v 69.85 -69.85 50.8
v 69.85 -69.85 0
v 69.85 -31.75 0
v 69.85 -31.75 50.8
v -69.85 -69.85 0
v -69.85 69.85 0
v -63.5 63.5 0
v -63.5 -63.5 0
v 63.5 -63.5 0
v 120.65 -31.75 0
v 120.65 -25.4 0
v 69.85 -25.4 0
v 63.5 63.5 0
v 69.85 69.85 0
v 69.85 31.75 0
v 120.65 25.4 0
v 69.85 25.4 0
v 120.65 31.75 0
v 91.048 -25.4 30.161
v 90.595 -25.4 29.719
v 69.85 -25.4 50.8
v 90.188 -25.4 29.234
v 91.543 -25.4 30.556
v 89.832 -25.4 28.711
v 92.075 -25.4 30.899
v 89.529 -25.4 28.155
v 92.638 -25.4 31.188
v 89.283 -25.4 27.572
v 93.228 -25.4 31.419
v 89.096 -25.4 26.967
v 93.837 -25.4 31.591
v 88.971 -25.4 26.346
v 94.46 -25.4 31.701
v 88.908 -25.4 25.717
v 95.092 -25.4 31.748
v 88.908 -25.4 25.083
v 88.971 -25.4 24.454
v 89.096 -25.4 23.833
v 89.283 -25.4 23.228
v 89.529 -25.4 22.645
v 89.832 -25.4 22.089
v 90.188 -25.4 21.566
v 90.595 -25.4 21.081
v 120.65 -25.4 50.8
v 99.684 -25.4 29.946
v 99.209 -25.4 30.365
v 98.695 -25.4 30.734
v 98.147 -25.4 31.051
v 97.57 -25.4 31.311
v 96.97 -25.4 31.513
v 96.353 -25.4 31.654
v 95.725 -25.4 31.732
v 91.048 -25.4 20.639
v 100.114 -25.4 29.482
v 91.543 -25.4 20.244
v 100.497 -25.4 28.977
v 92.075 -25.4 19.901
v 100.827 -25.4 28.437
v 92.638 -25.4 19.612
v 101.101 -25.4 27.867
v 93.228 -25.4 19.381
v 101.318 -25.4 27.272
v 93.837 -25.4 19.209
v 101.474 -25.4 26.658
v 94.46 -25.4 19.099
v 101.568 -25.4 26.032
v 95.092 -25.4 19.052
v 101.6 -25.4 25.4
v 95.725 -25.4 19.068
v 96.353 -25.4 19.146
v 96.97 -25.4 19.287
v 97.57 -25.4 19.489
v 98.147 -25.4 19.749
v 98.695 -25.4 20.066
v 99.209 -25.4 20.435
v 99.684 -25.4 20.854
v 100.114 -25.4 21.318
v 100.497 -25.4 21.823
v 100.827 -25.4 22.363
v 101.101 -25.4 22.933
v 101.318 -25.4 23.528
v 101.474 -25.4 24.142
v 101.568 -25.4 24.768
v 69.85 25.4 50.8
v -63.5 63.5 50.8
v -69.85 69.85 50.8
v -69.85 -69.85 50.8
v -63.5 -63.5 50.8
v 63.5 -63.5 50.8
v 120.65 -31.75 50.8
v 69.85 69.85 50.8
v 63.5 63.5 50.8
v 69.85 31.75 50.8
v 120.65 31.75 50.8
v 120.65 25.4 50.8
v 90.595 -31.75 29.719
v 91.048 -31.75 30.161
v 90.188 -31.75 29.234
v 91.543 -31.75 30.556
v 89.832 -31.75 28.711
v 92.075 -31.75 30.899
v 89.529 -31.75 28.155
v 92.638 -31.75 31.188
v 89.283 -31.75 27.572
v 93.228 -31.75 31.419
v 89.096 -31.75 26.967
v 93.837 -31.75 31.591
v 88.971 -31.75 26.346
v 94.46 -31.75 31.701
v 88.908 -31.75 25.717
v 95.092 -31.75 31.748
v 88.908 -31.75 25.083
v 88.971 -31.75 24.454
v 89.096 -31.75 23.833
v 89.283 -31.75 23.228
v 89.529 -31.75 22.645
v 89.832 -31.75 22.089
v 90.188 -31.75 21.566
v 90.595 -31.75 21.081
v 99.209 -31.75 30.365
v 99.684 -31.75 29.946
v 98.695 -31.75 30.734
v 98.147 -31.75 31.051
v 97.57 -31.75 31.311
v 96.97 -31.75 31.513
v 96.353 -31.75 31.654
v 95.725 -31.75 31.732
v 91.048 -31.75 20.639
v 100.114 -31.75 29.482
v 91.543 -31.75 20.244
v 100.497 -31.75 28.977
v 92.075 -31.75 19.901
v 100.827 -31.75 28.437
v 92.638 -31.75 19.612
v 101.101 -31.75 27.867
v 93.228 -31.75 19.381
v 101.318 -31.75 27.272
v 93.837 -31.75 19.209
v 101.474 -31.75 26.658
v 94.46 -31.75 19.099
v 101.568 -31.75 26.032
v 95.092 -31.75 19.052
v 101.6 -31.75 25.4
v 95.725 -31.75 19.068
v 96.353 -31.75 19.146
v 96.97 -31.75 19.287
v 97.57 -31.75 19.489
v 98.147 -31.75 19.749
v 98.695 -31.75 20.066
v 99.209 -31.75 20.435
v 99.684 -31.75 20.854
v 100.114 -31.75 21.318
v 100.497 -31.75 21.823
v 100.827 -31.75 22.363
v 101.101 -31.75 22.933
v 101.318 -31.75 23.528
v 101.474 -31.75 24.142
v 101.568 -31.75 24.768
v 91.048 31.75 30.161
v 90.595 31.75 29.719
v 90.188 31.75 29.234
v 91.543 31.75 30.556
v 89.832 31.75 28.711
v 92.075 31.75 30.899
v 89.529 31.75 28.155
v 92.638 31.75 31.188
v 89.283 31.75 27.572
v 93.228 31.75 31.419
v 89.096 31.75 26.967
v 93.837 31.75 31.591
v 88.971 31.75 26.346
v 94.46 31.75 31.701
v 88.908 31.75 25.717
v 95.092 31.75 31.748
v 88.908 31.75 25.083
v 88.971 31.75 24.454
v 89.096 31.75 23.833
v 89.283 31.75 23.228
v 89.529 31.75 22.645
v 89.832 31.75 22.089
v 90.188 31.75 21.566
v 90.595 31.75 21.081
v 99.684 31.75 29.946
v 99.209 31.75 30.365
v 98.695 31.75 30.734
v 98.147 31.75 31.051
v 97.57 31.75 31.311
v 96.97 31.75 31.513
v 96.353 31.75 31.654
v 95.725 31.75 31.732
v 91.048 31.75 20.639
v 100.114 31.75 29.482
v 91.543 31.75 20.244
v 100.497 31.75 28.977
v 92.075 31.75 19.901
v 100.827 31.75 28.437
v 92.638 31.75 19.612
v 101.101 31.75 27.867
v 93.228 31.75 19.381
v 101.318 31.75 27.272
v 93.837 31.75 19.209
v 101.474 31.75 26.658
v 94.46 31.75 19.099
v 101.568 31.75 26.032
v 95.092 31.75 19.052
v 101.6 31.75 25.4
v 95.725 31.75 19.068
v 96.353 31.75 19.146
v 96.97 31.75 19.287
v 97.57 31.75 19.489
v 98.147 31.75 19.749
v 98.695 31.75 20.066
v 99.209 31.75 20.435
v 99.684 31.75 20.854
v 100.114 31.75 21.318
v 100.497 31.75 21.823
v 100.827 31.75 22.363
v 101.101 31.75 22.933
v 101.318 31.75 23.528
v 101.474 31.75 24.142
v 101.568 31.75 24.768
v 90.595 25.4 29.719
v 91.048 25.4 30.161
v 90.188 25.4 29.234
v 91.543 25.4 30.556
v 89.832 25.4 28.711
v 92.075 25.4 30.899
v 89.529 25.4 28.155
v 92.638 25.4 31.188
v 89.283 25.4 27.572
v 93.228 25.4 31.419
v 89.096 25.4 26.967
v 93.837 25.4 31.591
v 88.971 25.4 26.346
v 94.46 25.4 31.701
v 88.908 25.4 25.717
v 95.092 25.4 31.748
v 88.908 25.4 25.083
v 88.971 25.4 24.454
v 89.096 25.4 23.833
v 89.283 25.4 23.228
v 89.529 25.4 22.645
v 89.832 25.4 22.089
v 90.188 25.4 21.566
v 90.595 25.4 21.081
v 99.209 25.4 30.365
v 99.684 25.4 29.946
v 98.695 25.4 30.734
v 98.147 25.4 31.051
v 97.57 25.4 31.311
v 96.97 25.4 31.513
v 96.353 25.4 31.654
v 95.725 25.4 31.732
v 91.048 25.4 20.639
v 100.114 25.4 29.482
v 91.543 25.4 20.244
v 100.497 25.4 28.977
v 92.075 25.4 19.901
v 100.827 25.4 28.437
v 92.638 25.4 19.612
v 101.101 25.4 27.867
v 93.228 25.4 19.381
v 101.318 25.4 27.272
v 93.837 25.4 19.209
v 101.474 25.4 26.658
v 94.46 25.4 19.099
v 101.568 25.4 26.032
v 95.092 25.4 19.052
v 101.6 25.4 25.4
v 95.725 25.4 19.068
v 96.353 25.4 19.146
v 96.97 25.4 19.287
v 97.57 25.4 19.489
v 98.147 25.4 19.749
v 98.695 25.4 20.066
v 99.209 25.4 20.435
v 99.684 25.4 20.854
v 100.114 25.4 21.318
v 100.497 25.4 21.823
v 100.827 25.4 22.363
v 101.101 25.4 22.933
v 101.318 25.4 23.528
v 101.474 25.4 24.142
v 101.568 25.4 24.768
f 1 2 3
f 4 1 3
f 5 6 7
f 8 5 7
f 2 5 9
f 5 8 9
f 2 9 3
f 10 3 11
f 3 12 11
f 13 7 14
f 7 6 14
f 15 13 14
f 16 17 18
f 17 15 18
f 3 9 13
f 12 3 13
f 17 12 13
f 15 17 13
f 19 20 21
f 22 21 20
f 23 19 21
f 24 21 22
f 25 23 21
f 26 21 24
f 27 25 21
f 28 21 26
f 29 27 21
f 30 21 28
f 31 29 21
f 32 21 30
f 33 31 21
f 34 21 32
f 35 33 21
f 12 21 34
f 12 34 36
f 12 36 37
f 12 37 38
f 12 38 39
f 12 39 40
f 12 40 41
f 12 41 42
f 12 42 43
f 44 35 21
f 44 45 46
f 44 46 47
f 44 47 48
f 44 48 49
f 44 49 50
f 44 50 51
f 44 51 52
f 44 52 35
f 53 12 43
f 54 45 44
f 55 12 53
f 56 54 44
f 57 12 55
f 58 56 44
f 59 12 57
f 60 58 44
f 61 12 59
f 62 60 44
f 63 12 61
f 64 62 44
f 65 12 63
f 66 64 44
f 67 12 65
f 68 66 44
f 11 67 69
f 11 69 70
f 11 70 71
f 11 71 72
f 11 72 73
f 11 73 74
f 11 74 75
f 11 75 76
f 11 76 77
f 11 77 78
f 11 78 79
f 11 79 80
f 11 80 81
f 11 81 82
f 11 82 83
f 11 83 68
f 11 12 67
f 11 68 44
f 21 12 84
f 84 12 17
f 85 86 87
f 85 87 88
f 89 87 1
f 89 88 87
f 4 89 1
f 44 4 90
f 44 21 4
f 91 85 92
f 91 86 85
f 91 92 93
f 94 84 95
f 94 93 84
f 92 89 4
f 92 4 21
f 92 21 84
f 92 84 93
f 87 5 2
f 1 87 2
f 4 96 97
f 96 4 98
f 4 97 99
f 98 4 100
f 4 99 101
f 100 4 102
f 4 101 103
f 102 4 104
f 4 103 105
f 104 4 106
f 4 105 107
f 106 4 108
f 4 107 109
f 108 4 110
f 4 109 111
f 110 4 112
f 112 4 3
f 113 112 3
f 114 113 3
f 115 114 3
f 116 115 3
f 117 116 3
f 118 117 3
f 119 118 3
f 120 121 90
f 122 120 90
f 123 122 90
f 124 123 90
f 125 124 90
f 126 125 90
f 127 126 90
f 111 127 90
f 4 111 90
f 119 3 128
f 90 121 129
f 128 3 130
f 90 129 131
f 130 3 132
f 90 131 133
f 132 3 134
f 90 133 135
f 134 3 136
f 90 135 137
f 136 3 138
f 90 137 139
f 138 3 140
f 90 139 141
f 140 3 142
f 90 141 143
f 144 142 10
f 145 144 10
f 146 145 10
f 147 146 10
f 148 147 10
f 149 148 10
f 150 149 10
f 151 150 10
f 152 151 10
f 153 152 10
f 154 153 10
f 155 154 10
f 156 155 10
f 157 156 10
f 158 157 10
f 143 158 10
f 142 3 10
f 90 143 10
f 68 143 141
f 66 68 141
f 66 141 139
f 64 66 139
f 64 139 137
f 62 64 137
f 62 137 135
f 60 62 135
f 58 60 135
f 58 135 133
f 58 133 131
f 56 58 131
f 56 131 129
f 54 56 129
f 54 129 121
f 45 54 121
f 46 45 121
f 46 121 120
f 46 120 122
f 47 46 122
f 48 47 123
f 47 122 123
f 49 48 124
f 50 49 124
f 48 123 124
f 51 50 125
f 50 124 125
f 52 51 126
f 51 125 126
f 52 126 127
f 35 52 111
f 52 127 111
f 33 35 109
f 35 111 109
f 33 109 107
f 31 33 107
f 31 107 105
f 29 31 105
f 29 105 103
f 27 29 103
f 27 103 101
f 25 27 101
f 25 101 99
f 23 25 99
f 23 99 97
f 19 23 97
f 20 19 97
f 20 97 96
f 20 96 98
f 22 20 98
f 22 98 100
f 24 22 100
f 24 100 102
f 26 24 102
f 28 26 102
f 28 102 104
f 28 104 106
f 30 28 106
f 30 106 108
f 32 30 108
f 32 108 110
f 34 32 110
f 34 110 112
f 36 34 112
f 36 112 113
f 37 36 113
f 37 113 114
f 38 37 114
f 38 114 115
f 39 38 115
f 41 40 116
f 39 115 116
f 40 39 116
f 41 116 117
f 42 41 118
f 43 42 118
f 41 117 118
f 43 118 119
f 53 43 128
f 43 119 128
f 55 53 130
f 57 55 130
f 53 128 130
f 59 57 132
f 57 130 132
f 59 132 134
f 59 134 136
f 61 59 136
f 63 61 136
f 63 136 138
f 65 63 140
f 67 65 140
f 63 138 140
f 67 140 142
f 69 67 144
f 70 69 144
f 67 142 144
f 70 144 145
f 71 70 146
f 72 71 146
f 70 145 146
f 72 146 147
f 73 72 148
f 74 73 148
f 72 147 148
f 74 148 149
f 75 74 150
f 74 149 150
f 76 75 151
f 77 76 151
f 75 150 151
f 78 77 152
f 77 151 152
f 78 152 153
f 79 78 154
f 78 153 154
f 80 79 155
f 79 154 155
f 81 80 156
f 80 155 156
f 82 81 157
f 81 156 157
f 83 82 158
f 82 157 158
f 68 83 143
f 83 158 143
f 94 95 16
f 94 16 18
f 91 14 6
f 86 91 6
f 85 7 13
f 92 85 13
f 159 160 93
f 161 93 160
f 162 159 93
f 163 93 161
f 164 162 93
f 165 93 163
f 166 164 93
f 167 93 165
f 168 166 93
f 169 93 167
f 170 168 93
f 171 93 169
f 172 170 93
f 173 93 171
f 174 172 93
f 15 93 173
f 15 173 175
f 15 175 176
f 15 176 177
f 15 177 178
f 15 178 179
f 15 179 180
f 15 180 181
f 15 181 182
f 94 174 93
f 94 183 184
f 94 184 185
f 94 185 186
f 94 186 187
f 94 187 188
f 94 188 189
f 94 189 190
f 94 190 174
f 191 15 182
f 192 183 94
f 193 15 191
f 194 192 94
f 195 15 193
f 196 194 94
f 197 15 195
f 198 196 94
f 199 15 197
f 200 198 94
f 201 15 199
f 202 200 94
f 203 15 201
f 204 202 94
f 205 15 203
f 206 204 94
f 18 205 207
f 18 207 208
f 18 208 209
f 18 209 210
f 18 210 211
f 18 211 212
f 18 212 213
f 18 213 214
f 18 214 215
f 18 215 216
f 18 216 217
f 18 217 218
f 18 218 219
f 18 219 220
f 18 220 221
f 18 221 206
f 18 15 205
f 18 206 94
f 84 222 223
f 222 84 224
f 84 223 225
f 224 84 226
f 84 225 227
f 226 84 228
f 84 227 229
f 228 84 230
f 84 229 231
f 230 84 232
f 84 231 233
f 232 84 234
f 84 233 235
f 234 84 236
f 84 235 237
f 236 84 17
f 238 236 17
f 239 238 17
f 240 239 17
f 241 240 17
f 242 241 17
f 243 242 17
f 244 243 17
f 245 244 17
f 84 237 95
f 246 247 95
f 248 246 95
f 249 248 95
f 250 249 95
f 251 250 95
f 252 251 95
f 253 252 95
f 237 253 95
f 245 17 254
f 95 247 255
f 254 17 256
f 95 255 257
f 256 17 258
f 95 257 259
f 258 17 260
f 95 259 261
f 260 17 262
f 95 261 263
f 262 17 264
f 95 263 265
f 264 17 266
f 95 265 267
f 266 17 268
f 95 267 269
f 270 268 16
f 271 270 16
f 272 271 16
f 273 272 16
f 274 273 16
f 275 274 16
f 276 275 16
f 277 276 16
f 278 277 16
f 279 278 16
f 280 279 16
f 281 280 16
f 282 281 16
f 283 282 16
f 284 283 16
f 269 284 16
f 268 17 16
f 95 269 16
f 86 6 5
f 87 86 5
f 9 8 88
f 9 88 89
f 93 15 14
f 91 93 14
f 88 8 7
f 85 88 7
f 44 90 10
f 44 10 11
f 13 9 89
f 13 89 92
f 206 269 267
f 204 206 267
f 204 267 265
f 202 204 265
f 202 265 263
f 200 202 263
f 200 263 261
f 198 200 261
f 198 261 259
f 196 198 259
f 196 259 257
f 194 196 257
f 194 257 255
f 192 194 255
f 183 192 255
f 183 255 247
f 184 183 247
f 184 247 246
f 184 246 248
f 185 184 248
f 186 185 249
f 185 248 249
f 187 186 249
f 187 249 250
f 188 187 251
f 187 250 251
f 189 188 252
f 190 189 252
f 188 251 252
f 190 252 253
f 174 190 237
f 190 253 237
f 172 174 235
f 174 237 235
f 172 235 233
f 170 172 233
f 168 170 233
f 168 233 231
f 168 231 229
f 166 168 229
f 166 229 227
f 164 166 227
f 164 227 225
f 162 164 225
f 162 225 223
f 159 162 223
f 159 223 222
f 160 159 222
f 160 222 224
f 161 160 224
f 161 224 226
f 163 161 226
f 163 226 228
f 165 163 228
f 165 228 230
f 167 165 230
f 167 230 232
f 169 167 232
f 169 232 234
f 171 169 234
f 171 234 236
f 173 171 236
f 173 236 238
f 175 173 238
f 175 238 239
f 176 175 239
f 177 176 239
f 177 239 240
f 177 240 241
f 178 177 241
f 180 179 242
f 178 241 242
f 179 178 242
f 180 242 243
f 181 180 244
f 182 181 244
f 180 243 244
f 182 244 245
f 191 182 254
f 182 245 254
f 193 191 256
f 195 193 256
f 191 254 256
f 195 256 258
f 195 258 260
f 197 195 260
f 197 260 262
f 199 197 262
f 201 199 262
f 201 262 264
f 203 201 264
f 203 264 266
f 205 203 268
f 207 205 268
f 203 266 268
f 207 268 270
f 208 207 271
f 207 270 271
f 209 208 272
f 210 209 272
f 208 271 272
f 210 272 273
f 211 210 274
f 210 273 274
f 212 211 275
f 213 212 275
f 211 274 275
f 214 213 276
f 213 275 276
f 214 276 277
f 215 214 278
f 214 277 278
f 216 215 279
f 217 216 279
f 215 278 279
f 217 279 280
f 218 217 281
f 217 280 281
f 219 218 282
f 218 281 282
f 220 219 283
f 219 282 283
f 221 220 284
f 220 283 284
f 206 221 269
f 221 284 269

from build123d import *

# Parameters (mm, degrees)
F0_W     = 127
F0_H     = 127
F0_W_2   = 50.8
F0_H_2   = 6.35
F1_DEPTH = 50.8
F2_R     = 6.35
F3_DEPTH = 101.601


with BuildPart() as f1:
    # F0 (on Top) → F1 (new body)
    with BuildSketch(Plane.XY):
        Polygon((-69.85, -69.85), (69.85, -69.85), (69.85, -31.75), (69.85, -25.4), (69.85, 25.4), (69.85, 31.75), (69.85, 69.85), (-69.85, 69.85), align=None)
        Rectangle(F0_W, F0_H, mode=Mode.SUBTRACT)
        with Locations((95.25, -28.575)):
            Rectangle(F0_W_2, F0_H_2)
        with Locations((95.25, 28.575)):
            Rectangle(F0_W_2, F0_H_2)
    extrude(amount=F1_DEPTH)

    # F2 (on face) → F3 (cut, through all)
    with BuildSketch(Plane.XZ.offset(31.75)):
        with Locations((95.25, 25.4)):
            Circle(F2_R)
    extrude(amount=-F3_DEPTH, mode=Mode.SUBTRACT)


solid = f1.part
